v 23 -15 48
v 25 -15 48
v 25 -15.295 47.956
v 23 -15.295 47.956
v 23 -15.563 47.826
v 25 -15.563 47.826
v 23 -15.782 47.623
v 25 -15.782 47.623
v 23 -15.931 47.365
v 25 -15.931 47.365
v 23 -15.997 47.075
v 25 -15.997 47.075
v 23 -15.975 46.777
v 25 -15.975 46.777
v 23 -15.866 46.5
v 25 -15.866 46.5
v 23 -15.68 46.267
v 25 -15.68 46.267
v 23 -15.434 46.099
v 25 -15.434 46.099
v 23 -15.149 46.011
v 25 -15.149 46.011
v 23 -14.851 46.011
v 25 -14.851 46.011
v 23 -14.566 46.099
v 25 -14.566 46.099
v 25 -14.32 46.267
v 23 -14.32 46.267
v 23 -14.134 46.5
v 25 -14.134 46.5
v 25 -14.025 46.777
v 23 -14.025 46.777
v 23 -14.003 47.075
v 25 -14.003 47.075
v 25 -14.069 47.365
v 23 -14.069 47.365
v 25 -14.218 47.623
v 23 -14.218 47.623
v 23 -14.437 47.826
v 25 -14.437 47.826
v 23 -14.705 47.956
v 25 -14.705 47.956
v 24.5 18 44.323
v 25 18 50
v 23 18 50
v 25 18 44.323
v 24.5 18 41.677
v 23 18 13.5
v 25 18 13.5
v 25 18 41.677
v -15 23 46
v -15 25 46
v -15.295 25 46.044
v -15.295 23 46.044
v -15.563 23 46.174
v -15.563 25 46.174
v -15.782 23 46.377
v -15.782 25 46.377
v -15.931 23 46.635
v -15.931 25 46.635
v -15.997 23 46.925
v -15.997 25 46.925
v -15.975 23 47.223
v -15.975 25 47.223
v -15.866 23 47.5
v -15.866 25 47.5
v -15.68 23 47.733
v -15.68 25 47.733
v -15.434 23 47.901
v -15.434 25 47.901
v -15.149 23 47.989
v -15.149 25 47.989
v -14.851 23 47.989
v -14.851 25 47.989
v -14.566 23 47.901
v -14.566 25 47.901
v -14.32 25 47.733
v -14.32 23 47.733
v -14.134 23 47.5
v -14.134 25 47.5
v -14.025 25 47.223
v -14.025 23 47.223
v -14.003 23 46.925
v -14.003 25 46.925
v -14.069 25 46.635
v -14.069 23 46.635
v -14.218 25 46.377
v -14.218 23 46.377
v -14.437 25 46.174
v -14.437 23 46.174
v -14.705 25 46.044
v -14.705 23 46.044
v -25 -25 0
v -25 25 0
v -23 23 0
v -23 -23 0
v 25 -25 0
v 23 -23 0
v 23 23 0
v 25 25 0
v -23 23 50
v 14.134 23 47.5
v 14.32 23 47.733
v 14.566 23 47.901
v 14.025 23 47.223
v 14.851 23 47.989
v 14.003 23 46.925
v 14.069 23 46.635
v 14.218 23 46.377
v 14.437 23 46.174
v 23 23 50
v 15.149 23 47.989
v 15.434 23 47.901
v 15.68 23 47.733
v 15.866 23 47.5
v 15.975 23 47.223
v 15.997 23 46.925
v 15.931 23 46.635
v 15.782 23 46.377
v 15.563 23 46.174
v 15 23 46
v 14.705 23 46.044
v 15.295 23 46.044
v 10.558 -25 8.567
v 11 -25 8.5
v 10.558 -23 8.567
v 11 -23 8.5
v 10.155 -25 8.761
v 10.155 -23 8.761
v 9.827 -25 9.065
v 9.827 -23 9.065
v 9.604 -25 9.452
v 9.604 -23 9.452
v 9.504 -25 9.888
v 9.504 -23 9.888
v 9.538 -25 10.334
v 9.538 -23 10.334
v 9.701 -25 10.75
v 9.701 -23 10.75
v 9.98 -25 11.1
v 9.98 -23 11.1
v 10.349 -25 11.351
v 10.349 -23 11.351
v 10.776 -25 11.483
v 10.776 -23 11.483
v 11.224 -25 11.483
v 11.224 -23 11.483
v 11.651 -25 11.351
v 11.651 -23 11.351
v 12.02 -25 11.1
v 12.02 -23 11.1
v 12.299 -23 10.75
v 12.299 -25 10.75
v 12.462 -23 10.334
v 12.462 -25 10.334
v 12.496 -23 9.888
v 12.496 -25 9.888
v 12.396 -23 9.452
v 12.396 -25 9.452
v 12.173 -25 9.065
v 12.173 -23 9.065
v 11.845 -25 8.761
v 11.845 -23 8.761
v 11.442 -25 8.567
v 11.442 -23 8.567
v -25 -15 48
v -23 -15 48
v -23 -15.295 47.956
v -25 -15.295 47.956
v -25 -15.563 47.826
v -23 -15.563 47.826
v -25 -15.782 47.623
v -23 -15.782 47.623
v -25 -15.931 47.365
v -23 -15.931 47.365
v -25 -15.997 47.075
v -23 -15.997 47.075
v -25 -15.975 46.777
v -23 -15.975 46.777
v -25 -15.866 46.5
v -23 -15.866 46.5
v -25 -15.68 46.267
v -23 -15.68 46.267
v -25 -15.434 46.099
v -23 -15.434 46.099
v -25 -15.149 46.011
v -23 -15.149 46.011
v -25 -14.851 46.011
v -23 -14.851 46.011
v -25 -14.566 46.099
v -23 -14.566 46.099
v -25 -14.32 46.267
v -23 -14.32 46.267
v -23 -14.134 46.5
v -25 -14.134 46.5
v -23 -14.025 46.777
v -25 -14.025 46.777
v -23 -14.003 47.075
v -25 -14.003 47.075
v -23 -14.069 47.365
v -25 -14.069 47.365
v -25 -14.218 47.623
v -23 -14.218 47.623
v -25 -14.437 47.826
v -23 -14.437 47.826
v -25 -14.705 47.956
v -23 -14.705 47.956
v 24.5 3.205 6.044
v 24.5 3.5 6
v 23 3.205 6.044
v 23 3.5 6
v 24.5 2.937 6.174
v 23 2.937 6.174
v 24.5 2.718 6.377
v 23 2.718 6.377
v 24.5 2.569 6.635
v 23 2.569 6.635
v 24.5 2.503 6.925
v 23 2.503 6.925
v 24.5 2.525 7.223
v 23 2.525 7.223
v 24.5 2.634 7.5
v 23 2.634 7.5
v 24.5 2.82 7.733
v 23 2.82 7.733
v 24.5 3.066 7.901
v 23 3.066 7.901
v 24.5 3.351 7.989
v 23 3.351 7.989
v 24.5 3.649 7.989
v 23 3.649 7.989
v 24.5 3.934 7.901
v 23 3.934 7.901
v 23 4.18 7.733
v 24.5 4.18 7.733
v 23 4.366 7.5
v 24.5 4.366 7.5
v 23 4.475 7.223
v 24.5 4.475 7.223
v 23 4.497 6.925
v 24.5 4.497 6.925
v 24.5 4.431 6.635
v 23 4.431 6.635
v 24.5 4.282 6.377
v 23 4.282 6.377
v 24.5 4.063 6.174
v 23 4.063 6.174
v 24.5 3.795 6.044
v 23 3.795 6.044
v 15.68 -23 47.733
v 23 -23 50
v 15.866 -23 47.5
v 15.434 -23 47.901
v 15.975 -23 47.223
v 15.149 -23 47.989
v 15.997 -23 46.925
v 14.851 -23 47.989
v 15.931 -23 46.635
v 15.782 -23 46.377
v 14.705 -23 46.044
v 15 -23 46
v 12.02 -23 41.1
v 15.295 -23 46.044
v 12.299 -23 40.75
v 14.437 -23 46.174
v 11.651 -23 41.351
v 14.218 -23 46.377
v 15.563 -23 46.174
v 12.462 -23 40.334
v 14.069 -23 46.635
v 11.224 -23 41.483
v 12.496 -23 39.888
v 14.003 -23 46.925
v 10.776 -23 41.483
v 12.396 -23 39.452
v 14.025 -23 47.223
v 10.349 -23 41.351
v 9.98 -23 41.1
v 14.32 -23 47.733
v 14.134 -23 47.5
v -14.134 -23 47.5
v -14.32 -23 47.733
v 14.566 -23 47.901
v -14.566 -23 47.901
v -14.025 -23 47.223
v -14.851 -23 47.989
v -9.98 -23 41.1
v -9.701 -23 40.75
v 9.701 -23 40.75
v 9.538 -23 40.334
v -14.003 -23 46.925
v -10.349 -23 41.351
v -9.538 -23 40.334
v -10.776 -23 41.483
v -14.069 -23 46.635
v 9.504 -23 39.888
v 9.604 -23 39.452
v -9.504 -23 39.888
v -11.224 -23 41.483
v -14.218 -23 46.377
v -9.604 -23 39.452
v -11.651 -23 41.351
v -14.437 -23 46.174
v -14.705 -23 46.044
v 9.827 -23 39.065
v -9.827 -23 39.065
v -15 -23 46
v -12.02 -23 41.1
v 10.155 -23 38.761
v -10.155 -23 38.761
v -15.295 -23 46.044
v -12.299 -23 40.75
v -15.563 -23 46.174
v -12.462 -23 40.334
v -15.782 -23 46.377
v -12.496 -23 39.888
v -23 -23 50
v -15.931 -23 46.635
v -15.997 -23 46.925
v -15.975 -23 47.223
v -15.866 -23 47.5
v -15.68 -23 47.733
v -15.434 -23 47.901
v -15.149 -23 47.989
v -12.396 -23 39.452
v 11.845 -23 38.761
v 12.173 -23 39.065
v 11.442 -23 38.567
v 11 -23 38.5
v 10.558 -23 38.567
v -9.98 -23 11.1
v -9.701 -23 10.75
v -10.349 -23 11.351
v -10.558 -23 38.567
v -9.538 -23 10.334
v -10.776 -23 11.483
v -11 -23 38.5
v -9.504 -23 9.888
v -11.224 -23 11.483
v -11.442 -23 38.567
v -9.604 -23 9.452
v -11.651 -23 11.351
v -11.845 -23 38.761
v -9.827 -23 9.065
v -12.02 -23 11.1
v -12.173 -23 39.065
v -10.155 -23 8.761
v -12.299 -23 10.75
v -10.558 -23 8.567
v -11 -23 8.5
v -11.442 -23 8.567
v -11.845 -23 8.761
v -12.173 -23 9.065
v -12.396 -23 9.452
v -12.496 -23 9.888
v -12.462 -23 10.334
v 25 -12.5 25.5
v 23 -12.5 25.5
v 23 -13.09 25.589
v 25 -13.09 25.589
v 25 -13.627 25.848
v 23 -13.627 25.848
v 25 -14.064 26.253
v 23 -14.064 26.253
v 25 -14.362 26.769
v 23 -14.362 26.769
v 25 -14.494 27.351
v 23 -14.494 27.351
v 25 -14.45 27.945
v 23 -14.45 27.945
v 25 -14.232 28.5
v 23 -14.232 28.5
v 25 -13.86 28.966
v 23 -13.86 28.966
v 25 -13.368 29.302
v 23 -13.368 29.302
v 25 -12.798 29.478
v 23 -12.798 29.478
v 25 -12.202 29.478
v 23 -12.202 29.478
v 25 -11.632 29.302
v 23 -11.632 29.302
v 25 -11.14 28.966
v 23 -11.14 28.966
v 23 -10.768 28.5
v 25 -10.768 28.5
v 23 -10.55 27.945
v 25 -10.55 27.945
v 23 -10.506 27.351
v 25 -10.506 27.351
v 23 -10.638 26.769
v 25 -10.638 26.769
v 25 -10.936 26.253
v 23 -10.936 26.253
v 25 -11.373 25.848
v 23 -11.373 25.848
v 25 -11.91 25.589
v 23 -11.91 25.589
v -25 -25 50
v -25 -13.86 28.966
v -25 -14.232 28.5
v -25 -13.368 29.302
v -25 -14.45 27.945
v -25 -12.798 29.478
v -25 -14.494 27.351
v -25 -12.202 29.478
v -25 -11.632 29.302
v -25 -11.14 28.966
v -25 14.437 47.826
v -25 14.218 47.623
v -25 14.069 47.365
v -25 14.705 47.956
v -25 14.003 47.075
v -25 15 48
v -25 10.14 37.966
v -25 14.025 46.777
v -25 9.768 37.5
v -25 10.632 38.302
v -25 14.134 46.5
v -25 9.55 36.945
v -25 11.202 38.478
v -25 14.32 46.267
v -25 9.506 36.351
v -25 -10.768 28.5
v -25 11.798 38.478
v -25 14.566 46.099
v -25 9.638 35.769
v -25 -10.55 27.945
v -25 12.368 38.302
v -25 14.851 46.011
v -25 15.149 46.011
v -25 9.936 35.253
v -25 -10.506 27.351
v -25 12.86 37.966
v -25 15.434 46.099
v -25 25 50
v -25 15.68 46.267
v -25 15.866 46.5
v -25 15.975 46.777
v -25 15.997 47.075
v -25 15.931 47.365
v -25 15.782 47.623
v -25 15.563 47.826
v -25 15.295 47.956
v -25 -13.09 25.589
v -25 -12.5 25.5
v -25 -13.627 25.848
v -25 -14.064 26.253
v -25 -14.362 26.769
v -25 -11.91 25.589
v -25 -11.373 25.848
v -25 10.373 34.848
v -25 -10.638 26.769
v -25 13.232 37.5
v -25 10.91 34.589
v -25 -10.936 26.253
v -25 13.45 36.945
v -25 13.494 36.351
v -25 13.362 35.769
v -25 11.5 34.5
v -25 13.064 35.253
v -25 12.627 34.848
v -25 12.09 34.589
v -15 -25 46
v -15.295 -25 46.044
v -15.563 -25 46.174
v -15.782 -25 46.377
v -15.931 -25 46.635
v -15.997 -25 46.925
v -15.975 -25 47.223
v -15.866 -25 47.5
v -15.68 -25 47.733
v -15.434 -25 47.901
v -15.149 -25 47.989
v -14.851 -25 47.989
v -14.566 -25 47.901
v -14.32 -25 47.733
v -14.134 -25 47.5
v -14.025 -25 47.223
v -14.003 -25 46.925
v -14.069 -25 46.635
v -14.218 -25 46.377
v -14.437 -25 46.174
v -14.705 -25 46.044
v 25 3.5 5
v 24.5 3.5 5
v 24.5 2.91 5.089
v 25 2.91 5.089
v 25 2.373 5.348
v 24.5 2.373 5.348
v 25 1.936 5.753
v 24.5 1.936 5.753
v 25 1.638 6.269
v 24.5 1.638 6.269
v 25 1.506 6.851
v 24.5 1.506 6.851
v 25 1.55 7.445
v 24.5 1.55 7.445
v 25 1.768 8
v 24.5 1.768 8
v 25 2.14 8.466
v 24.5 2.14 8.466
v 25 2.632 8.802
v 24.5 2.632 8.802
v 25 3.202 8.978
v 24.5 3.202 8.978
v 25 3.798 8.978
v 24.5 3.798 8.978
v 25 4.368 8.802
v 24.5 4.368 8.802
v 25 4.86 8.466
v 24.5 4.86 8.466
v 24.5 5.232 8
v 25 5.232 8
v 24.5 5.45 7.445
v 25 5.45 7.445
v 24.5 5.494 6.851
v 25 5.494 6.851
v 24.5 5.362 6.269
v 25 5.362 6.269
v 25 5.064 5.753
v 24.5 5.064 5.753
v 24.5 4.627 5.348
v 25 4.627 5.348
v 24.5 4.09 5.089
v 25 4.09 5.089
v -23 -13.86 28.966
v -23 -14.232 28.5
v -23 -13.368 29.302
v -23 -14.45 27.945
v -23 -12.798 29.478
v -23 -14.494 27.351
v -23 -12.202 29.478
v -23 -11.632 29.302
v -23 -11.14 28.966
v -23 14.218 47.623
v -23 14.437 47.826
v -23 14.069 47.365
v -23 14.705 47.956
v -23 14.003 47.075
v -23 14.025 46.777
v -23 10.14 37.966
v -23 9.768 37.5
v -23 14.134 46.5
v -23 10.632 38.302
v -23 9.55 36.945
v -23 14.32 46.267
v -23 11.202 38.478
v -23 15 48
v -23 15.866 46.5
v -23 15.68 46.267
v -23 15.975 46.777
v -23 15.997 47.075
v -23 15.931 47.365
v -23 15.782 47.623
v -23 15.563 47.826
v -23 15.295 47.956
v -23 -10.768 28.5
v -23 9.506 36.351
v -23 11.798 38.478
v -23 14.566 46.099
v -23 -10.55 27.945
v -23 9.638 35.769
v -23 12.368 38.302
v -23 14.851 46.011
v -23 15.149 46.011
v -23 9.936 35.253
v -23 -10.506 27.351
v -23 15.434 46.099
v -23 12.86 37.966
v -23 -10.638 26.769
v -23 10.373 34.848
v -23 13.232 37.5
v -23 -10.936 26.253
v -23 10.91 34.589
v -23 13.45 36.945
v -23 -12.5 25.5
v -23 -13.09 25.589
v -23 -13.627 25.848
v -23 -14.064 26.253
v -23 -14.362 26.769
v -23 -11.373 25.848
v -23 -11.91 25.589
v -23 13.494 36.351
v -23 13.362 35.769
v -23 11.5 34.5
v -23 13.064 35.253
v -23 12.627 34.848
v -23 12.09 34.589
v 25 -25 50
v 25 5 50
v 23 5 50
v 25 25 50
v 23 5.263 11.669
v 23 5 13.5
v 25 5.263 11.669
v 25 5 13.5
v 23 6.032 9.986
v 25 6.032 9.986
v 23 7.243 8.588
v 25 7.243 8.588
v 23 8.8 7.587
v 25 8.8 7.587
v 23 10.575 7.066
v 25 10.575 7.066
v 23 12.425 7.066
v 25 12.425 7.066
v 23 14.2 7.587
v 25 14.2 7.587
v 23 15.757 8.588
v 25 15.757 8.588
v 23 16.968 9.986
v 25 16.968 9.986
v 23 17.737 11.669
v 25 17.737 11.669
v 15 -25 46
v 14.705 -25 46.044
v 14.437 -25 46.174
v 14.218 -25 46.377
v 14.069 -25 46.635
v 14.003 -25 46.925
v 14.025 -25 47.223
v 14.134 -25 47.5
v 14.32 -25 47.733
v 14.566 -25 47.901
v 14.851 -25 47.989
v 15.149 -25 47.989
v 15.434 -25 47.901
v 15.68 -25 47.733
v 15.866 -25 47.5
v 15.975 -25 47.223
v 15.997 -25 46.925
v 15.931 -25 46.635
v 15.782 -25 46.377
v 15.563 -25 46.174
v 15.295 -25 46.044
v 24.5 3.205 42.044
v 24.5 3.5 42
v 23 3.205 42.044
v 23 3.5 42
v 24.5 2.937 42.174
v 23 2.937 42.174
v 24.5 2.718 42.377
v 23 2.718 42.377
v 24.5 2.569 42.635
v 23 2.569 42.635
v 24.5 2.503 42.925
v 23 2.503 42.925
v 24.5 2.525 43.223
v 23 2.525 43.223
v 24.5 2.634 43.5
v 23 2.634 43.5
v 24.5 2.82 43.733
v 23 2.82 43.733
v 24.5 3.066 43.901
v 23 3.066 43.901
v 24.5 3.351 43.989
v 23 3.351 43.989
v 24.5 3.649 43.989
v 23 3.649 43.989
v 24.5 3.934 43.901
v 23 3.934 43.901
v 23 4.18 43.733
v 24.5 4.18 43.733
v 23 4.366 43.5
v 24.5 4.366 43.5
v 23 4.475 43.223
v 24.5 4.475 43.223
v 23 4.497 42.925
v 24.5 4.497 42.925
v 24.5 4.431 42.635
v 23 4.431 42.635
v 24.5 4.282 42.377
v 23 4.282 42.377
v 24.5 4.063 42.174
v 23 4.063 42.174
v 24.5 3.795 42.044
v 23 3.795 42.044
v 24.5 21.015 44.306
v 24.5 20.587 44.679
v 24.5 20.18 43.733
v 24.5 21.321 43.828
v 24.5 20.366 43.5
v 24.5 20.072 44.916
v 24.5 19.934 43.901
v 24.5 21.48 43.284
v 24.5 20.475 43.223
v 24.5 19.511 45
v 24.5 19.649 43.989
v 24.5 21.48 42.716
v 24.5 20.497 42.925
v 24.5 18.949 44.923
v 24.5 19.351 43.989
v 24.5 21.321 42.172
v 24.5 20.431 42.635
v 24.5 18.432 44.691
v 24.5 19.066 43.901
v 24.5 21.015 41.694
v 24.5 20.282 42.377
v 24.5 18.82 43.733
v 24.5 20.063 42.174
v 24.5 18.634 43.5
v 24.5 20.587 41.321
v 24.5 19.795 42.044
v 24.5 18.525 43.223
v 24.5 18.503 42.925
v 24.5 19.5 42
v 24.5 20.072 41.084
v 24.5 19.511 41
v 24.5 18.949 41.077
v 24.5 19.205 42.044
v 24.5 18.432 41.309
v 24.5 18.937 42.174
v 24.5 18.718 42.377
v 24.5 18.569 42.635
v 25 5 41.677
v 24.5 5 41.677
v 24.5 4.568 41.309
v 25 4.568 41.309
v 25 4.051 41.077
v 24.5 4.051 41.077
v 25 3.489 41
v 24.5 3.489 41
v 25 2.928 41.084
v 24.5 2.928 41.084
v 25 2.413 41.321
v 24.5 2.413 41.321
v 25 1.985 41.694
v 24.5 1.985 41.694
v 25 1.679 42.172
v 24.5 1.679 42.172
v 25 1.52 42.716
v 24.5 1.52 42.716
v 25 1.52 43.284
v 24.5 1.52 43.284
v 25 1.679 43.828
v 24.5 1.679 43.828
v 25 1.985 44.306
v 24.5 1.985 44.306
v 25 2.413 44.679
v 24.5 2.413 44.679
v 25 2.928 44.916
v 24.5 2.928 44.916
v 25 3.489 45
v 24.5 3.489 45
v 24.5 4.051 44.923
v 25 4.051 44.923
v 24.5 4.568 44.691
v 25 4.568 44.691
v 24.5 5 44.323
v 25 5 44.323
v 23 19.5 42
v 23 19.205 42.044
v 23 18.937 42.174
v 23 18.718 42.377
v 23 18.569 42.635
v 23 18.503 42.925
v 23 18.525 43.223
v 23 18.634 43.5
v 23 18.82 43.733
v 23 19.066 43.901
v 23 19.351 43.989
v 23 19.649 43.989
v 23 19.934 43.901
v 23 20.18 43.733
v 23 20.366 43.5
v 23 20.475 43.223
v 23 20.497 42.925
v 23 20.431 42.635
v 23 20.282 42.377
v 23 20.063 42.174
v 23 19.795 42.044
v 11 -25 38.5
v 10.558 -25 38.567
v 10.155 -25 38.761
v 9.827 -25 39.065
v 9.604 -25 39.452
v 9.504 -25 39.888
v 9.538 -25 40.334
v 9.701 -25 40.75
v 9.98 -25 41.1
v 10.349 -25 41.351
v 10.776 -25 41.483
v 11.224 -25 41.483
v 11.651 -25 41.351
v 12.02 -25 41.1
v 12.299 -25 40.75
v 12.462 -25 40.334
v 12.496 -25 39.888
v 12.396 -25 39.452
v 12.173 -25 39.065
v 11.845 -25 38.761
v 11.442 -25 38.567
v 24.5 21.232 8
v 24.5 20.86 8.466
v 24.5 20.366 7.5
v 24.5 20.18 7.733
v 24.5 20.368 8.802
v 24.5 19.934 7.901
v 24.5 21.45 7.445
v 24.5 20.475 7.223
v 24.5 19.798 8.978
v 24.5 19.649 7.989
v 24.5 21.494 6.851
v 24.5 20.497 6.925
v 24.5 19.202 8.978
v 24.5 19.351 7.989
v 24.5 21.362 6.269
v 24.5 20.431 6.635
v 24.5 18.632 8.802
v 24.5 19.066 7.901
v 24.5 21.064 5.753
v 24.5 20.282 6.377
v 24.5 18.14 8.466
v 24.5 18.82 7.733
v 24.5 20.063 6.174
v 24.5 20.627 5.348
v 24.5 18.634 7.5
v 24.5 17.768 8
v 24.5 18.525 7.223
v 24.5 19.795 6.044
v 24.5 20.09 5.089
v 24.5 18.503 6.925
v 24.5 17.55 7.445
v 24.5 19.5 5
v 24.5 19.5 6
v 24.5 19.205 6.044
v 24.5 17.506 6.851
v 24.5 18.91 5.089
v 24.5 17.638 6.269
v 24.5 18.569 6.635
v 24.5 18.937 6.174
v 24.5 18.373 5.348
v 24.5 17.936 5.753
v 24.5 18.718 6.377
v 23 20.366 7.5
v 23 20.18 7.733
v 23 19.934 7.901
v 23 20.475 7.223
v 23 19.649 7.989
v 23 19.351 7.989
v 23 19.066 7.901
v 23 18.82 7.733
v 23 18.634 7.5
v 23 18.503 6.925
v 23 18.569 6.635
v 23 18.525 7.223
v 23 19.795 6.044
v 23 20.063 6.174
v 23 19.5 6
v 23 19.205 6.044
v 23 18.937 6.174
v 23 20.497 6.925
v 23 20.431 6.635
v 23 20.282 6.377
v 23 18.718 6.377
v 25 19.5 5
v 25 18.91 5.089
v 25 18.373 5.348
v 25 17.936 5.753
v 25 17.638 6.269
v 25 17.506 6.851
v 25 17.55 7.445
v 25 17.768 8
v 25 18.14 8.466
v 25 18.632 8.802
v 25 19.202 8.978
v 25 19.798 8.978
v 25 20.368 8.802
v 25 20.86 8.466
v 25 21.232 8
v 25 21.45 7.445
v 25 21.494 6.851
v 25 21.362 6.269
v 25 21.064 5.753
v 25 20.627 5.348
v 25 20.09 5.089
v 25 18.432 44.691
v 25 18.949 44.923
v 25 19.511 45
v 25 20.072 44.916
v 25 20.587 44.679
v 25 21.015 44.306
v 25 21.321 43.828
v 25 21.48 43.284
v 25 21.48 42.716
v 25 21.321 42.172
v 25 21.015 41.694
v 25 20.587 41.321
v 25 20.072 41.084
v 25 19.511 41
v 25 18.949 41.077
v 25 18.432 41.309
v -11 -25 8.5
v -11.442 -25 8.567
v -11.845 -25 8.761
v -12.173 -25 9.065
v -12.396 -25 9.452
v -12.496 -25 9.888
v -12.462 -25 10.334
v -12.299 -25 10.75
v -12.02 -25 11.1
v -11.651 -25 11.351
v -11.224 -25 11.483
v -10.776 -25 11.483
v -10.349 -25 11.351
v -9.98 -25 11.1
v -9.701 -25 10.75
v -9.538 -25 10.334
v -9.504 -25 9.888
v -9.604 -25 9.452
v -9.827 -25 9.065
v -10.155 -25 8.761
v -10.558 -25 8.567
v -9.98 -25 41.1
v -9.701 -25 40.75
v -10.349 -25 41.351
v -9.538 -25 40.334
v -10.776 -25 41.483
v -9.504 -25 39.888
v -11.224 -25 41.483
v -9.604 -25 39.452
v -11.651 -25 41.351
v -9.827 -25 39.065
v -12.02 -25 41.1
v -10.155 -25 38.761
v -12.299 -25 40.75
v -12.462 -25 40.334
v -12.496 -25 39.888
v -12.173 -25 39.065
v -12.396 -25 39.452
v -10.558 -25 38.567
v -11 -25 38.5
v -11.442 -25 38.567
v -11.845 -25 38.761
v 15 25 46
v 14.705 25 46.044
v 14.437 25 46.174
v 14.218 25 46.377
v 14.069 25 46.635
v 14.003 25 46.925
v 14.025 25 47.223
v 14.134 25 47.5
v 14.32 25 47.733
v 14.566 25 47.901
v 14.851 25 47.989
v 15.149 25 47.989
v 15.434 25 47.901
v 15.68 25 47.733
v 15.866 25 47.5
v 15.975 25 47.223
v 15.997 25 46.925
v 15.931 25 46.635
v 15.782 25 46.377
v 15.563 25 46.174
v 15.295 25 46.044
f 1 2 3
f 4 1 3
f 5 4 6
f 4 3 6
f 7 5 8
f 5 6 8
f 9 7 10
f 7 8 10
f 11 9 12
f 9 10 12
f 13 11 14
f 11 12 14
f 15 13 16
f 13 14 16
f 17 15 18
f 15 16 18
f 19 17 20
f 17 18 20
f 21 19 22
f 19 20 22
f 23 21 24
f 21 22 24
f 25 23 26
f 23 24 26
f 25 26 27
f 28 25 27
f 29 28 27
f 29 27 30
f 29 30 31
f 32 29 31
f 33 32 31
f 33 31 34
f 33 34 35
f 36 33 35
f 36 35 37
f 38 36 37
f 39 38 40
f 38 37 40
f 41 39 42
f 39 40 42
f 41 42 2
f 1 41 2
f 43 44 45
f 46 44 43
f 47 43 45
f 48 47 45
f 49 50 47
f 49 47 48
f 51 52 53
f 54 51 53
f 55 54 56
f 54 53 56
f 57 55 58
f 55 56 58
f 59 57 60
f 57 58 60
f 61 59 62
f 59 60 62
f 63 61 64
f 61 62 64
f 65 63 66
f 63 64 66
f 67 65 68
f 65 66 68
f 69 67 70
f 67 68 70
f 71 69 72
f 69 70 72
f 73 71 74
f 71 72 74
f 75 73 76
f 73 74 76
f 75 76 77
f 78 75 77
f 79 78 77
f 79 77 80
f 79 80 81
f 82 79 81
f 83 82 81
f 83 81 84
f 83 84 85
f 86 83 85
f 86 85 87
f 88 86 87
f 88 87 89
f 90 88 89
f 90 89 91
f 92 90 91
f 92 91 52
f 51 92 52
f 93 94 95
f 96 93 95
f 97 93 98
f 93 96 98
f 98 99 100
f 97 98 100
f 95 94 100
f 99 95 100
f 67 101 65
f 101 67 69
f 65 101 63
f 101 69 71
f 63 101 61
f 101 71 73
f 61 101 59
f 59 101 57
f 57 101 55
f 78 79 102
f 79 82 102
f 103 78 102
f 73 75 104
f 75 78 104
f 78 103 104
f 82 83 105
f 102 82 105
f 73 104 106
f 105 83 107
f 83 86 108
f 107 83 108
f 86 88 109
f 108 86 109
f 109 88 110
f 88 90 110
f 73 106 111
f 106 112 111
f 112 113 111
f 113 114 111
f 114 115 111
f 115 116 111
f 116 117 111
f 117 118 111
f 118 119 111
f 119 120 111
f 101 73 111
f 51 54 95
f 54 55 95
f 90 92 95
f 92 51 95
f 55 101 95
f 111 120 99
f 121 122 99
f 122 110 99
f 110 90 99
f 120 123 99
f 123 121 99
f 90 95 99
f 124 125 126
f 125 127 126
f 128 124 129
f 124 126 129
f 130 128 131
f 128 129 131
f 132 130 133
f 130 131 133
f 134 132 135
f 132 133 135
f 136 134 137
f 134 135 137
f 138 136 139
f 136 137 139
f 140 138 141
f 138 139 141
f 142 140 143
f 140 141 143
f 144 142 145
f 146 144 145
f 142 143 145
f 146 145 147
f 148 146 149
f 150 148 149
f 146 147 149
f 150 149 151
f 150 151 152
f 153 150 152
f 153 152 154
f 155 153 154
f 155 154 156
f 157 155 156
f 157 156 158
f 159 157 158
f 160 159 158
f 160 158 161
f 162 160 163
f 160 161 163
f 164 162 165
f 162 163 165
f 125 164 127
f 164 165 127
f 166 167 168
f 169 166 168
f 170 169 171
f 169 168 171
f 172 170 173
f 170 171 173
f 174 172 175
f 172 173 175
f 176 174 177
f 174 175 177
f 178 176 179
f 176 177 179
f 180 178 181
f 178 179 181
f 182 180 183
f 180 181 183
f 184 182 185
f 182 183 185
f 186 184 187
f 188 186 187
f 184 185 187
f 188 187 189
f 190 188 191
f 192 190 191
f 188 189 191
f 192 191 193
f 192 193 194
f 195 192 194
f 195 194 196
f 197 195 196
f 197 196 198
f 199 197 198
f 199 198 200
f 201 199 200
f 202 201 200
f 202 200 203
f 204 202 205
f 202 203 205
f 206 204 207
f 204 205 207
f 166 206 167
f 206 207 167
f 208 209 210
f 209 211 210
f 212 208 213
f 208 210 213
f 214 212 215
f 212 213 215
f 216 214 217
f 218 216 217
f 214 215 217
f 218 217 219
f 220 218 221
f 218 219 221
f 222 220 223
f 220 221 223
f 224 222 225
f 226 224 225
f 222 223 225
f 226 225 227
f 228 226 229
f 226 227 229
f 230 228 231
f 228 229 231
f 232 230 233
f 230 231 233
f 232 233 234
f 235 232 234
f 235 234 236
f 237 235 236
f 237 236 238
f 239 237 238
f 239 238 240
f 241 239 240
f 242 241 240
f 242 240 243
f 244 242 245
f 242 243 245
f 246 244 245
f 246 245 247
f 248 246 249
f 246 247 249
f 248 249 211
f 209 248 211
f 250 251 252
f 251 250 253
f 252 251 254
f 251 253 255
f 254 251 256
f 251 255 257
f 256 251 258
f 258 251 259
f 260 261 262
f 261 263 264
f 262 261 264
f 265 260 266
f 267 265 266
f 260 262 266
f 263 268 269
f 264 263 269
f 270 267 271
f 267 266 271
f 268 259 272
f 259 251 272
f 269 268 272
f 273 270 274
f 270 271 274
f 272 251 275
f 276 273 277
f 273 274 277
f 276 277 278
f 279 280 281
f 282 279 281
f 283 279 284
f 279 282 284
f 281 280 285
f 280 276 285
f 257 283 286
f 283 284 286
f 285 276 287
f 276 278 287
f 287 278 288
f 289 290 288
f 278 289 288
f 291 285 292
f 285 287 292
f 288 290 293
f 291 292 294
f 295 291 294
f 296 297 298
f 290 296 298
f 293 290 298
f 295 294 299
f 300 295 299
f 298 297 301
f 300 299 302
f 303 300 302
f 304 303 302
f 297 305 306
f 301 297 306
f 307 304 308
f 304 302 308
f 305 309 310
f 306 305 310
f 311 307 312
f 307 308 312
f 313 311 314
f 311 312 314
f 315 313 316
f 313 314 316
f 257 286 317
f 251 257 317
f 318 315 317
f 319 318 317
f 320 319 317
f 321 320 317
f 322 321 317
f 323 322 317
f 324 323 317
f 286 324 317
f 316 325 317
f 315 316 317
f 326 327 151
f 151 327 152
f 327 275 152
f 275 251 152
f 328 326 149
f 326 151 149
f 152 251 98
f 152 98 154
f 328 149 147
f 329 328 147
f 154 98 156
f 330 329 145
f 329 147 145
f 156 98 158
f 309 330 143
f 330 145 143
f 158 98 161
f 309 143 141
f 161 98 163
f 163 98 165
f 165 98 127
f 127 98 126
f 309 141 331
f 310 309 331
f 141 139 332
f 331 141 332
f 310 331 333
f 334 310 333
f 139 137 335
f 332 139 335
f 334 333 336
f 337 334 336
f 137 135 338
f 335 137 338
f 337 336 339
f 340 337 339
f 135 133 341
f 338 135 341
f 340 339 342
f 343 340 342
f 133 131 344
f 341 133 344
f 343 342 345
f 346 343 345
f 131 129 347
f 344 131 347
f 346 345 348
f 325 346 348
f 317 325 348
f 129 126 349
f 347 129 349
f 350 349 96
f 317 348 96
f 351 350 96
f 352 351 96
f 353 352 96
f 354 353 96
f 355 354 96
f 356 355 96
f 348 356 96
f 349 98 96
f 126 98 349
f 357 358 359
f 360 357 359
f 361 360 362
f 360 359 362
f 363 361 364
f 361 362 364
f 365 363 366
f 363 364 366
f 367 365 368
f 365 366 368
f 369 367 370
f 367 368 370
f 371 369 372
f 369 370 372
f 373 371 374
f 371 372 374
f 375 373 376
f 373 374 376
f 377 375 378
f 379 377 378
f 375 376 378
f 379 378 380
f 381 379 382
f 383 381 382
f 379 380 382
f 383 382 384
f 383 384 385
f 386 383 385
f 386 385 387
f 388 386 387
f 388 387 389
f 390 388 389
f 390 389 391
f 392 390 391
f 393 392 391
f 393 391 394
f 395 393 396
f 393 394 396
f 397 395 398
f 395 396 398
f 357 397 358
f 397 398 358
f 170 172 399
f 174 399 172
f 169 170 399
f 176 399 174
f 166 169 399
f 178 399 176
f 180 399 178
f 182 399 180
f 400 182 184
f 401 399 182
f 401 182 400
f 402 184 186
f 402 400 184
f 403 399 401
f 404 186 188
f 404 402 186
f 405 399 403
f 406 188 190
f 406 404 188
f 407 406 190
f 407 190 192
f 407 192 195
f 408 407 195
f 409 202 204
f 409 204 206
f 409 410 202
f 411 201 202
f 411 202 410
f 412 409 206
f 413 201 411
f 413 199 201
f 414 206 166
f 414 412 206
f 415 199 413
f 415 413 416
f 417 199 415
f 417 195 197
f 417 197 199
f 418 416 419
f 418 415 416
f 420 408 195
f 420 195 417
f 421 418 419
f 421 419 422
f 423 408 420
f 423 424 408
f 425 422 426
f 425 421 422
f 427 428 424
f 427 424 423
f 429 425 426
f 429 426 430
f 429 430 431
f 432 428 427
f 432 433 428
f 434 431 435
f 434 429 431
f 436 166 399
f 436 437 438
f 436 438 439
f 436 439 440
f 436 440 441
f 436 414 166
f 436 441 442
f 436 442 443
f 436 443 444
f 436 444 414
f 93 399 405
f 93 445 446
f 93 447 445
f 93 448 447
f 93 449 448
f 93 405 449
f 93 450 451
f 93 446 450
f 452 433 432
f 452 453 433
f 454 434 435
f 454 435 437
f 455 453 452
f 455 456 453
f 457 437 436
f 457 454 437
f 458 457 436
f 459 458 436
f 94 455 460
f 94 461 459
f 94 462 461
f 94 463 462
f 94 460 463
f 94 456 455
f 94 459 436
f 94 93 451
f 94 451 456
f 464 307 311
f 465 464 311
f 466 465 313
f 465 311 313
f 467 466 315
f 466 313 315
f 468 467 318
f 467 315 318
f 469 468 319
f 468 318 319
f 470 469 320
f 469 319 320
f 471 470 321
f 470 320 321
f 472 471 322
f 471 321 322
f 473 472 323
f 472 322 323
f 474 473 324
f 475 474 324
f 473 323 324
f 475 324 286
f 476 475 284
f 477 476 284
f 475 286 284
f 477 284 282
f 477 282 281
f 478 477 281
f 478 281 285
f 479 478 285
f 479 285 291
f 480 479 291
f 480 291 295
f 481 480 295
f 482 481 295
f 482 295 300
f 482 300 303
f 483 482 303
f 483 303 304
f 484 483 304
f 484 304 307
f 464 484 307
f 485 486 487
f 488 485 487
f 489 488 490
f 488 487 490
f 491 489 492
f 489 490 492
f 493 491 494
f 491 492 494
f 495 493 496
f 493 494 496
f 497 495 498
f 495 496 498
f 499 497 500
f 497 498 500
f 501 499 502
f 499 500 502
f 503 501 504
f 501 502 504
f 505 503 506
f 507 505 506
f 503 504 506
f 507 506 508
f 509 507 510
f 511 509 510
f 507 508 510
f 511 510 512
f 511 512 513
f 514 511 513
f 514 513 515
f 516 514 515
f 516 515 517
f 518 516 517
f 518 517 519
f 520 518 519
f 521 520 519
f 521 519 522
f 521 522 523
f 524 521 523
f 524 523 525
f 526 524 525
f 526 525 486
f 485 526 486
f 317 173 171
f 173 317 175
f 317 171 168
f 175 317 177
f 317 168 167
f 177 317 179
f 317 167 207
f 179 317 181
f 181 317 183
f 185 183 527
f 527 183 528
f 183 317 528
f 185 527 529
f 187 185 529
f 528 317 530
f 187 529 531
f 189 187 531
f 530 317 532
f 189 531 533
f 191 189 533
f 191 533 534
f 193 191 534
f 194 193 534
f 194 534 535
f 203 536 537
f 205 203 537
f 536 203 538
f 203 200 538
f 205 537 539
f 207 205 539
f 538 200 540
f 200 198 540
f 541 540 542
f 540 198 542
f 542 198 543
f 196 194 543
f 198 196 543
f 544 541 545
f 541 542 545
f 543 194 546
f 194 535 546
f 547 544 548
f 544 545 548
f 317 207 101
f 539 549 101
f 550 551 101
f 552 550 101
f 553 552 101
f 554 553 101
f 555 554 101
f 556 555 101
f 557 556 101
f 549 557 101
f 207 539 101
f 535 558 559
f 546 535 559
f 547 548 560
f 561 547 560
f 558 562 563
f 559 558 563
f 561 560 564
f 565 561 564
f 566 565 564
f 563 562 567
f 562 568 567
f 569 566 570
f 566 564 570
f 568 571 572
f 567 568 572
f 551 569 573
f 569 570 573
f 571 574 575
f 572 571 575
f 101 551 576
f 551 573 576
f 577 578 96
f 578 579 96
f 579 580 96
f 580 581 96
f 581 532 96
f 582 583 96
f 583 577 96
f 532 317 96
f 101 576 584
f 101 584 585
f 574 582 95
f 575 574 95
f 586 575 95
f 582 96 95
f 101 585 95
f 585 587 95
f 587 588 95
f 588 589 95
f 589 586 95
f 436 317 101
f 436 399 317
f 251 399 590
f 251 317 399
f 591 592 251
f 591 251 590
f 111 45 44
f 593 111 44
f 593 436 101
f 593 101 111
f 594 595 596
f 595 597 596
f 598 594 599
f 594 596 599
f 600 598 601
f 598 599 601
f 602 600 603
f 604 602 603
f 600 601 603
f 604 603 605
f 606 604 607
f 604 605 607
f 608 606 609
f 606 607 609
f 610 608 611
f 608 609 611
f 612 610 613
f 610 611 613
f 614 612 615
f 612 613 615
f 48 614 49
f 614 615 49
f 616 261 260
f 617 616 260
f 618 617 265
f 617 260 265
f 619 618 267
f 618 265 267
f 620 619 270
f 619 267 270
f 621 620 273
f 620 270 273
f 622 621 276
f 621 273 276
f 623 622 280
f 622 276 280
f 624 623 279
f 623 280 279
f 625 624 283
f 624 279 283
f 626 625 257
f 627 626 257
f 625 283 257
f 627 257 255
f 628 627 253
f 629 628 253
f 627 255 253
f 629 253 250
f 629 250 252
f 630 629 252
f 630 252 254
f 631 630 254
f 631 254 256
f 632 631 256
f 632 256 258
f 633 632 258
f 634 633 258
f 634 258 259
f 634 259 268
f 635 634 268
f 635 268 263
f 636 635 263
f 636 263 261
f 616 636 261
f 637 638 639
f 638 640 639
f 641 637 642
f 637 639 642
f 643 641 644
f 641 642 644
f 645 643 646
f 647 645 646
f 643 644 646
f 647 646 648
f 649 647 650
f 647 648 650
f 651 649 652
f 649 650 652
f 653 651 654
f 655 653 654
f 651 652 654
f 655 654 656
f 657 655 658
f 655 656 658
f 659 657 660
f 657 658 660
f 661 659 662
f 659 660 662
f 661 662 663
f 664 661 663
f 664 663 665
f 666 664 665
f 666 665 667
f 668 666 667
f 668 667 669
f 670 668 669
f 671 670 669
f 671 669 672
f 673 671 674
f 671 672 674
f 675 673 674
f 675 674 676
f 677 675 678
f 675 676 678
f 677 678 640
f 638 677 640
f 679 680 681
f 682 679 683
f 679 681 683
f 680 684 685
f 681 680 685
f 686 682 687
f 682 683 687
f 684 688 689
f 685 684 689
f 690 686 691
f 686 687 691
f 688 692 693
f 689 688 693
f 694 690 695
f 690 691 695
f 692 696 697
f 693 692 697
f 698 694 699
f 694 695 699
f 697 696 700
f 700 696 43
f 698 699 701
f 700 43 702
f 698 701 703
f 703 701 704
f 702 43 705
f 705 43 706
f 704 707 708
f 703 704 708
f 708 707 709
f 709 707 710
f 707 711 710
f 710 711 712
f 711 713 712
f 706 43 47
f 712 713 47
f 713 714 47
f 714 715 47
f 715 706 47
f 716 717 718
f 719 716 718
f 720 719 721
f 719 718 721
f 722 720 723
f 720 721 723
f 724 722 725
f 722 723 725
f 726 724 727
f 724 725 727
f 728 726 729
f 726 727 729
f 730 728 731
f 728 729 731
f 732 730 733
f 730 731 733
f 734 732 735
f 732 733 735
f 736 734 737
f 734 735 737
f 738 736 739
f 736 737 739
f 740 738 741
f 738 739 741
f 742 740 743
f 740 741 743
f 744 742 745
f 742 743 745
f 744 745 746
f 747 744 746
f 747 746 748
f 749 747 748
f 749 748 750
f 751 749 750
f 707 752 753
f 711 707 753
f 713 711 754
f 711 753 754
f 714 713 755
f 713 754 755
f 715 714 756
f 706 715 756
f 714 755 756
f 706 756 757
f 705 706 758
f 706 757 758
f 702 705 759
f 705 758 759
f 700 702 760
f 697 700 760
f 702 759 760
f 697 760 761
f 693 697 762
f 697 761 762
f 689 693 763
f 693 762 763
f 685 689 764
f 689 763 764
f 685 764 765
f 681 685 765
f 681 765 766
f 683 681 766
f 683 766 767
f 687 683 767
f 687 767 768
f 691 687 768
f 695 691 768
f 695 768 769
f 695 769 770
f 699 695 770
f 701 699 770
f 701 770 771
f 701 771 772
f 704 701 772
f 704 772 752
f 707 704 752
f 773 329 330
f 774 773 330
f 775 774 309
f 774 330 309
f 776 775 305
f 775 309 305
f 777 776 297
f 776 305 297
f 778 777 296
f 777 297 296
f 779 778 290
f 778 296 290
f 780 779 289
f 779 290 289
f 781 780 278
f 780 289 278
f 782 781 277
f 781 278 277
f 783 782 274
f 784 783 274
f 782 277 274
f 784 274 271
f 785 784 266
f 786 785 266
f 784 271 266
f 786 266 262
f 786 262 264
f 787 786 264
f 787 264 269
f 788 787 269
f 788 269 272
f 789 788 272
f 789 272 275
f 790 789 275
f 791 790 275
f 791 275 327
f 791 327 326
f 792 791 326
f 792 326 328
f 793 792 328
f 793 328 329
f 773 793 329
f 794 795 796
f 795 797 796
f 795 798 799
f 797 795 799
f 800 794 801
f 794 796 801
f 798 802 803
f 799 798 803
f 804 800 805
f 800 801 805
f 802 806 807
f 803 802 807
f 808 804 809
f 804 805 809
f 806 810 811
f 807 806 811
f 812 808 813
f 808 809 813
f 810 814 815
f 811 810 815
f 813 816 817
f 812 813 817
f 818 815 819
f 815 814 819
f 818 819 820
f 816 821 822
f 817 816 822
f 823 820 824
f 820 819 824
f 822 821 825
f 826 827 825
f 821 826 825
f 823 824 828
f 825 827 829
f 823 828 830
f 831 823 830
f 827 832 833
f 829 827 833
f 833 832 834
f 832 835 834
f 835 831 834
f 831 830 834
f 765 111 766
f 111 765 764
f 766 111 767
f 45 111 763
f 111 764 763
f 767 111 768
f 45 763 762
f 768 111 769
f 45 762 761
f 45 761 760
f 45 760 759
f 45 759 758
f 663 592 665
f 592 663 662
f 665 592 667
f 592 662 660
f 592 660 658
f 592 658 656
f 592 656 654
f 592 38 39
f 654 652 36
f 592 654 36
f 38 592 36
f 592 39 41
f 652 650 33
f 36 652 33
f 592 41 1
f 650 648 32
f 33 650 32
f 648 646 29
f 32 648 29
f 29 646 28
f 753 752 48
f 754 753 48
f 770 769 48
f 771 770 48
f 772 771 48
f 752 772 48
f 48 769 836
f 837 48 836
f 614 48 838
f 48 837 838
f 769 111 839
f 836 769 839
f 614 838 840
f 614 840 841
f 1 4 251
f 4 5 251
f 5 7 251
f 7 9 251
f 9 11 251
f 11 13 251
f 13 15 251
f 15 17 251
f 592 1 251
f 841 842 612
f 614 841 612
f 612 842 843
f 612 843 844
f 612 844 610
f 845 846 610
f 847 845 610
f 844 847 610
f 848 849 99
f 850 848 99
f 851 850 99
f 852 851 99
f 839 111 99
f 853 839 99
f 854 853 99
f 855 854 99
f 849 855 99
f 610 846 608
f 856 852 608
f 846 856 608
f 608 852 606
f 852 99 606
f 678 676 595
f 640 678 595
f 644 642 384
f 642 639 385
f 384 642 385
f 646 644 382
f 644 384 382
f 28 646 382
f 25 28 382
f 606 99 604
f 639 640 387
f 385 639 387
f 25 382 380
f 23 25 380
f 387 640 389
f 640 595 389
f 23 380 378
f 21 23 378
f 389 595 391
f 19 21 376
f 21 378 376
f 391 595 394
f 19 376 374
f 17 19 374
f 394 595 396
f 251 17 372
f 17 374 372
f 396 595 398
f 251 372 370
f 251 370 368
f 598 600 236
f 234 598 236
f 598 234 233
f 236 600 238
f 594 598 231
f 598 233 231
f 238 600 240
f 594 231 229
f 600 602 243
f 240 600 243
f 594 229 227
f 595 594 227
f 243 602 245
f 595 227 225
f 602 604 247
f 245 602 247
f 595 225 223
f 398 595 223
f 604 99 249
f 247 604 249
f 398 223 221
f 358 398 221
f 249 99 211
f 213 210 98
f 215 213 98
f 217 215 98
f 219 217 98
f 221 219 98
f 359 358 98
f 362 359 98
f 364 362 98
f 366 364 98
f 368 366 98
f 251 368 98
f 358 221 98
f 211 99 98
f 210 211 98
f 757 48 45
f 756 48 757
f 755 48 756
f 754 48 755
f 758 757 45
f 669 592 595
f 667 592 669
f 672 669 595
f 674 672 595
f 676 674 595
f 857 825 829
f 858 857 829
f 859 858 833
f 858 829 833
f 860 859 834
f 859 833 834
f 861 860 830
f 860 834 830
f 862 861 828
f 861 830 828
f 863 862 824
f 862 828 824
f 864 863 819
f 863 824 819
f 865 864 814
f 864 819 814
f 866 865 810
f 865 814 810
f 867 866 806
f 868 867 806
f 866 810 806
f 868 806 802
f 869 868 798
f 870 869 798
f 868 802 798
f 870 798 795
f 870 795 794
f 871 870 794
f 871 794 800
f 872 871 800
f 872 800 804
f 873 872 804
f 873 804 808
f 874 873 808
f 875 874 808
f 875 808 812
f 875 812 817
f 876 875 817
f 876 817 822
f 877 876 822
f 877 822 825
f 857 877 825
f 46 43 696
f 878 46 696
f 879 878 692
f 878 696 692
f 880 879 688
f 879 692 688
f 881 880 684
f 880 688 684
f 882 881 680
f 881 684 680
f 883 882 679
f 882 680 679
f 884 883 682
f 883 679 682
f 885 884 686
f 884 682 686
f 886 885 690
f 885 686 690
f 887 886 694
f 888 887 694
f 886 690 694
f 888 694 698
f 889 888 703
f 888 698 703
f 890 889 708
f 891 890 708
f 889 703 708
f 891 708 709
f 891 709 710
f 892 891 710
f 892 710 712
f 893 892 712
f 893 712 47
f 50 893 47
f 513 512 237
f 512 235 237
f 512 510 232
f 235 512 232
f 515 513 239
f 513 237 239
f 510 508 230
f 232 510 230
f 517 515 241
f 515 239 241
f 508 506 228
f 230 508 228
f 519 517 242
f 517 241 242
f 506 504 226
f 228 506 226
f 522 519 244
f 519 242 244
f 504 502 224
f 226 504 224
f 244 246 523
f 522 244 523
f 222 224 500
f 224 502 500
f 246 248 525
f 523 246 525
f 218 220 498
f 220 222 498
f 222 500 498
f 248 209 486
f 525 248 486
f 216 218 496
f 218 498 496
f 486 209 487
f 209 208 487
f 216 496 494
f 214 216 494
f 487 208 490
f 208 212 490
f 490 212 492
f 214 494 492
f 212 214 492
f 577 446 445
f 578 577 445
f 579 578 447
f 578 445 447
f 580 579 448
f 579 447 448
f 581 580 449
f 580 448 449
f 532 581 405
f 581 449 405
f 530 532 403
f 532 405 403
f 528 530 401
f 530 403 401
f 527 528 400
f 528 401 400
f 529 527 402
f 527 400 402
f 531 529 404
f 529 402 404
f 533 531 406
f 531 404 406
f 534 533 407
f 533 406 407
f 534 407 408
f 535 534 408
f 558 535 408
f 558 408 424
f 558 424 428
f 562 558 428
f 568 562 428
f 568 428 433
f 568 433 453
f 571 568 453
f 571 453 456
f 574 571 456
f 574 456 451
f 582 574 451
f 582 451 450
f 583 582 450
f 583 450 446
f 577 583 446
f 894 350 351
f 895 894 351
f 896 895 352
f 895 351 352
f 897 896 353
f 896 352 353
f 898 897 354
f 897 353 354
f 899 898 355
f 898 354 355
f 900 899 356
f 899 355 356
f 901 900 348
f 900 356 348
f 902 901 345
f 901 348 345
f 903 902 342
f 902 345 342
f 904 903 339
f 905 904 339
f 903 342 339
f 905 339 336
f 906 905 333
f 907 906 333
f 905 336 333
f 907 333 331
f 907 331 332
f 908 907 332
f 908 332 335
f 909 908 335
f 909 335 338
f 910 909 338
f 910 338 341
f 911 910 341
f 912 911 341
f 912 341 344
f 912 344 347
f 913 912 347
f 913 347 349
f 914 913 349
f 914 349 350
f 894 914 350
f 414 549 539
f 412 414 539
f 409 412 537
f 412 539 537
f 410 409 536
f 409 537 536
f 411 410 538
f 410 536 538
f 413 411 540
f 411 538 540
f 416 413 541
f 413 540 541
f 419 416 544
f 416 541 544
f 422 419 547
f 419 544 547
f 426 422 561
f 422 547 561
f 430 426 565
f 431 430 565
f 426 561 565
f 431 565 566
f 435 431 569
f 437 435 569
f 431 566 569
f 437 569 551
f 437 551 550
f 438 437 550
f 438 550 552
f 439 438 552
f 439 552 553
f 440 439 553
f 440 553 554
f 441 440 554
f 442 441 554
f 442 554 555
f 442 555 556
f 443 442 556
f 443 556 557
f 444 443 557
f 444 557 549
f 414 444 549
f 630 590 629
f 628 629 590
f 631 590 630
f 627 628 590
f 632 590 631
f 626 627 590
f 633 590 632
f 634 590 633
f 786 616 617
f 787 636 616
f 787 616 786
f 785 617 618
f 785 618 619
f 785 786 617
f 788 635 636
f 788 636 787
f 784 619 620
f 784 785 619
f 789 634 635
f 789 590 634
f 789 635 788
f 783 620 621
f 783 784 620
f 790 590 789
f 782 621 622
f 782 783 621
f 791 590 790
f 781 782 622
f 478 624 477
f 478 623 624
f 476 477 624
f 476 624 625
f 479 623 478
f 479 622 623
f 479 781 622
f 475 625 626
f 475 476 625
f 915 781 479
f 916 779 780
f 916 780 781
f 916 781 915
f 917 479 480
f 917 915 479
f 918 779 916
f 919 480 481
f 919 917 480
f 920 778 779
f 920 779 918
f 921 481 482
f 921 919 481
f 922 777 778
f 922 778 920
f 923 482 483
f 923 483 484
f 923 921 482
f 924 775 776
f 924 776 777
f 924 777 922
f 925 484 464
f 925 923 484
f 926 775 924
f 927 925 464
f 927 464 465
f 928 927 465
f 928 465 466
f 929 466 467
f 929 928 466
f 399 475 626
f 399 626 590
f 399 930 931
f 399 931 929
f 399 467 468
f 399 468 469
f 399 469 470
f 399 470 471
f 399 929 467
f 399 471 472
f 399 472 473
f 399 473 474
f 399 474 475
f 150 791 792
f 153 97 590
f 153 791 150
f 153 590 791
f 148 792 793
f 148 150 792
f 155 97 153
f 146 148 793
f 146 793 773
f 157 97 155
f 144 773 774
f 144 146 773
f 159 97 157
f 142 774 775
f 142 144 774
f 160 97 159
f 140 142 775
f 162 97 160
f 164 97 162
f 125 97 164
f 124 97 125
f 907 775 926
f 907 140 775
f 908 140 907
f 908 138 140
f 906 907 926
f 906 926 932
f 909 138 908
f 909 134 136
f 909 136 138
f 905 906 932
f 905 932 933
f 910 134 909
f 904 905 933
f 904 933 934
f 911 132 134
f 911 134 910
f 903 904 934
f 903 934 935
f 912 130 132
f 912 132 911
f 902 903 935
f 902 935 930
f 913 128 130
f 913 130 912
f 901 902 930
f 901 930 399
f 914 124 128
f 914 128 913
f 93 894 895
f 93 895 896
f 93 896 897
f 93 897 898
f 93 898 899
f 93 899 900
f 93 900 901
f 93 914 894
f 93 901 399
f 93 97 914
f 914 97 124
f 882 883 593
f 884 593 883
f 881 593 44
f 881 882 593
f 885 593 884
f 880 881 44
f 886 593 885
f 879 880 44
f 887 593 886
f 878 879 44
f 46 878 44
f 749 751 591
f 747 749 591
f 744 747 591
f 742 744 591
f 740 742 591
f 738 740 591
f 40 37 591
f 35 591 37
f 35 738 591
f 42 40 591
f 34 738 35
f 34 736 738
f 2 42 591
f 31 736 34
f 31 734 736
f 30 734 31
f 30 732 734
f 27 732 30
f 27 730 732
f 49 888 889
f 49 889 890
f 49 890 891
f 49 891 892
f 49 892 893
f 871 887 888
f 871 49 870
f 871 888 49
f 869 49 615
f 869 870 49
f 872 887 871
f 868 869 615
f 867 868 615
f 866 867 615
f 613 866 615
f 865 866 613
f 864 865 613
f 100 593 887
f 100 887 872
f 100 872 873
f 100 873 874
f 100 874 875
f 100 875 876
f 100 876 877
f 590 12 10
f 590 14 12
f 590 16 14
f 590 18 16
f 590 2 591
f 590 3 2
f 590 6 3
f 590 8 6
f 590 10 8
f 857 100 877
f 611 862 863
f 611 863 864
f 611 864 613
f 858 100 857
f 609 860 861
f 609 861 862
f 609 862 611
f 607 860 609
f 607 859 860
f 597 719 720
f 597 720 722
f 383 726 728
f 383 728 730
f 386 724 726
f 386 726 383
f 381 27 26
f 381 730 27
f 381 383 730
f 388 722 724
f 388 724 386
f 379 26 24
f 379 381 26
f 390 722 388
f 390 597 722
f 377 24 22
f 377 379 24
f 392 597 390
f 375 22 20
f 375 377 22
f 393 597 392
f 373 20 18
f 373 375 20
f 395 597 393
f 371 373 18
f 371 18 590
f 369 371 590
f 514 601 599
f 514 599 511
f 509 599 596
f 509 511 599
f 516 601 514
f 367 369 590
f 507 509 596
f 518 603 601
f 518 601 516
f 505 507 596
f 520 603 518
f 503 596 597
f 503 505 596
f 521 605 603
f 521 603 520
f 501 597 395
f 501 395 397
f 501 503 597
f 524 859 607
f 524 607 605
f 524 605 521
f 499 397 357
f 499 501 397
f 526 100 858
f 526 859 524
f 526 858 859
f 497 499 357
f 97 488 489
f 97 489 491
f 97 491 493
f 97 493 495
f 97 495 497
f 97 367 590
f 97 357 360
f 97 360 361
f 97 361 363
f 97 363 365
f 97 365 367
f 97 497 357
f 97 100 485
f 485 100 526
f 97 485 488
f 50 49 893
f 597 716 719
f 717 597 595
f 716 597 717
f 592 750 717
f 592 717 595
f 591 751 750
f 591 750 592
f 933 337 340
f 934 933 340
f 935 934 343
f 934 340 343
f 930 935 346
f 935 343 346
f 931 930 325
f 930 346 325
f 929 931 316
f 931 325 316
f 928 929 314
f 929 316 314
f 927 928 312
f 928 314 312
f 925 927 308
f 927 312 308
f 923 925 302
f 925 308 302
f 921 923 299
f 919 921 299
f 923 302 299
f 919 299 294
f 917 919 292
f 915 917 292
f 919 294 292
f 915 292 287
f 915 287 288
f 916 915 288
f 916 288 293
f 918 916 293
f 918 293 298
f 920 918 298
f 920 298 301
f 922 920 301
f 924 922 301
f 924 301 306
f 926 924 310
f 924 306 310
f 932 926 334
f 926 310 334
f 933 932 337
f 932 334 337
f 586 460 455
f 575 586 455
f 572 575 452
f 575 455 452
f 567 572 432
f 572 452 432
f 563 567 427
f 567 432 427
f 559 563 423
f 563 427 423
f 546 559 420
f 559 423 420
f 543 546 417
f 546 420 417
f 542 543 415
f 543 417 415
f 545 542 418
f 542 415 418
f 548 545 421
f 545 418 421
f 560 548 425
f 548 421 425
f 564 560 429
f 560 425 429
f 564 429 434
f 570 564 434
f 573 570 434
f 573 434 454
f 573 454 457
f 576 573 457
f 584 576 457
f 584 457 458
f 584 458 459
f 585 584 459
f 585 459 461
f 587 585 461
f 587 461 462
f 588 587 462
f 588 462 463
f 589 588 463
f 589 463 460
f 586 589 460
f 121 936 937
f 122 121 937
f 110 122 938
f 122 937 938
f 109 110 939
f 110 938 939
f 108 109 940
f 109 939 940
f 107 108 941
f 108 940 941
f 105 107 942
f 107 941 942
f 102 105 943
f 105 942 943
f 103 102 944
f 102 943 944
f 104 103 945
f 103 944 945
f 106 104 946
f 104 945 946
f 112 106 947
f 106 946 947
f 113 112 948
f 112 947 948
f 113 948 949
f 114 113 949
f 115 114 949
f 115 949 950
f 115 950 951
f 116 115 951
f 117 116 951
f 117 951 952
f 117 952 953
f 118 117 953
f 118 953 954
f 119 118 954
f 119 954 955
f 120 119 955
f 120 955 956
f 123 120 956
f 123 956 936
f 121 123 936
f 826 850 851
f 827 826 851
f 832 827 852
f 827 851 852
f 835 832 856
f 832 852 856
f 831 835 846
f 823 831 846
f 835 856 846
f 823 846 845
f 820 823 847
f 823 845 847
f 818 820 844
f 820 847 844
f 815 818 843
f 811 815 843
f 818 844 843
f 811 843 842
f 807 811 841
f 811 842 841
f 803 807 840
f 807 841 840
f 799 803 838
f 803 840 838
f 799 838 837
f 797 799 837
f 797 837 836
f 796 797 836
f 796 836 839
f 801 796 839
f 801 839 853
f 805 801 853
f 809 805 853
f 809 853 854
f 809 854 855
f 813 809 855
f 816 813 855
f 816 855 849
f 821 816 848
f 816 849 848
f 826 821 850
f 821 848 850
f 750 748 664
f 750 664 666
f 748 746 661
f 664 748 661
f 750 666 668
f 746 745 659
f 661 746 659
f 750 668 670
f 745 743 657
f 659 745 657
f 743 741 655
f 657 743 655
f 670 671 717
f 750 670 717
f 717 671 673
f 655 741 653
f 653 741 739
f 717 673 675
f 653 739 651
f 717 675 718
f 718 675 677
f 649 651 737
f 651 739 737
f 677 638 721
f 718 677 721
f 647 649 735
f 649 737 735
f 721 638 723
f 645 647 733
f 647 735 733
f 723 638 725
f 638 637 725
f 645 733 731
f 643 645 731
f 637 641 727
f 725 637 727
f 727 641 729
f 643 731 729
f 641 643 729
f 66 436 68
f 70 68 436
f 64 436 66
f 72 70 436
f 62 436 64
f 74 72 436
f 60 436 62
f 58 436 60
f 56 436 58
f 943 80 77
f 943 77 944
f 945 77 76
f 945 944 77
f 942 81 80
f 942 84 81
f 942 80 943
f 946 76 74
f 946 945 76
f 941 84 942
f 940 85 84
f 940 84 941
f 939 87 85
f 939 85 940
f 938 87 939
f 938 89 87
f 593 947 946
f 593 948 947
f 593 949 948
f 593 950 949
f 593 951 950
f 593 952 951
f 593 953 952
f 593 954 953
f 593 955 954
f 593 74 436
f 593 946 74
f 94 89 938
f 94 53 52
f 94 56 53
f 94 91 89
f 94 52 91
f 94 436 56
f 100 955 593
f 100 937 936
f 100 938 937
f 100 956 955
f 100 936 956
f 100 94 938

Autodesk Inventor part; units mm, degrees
ref_plane "YZ Plane" through (0, 0, 0) normal (1, 0, 0) x (0, 1, 0)
ref_plane "XZ Plane" through (0, 0, 0) normal (0, 1, 0) x (-1, 0, 0)
ref_plane "XY Plane" through (0, 0, 0) normal (0, 0, 1) x (1, 0, 0)
sketch "スケッチ1" plane through (0, 0, 0) normal (0, 0, 1) x (1, 0, 0)
  line L0 (-25, 25) -> (25, 25)
  line L1 (25, 25) -> (25, -25)
  line L2 (25, -25) -> (-25, -25)
  line L3 (-25, -25) -> (-25, 25)
  line L4 (-23, 23) -> (23, 23)
  line L5 (23, 23) -> (23, -23)
  line L6 (23, -23) -> (-23, -23)
  line L7 (-23, -23) -> (-23, 23)
  point P0 (0, 0)
  dimension "d0" = 50
  dimension "d1" = 50
  dimension "d4" = 25
  dimension "d5" = 25
  dimension "d6" = 46
  dimension "d7" = 2
  dimension "d8" = 46
  dimension "d9" = 2
extrude "押し出し1" add sketch "スケッチ1" along normal blind 50
sketch "スケッチ2" plane through (25, -25, 0) normal (1, 0, 0) x (0, 0, -1)
  line L0 (-50, 50) -> (-50, 0) projected
  line L1 (-50, 43) -> (-13.5, 43)
  line L2 (-13.5, 30) -> (-50, 30)
  line L3 (-50, 30) -> (-50, 43)
  arc A0 (-13.5, 30) -> (-13.5, 43) centre (-13.5, 36.5) ccw
  line L4 (0, 50) -> (-50, 50) projected
  point P0 (0, 25)
  point P1 (-11.7323, 30.245)
  dimension "d34" = 13
  dimension "d43" = 13
  dimension "d44" = 6.5
  dimension "d46" = 36.5
  dimension "d236" = 7
extrude "押し出し2" cut sketch "スケッチ2" against normal blind 30.5
sketch "スケッチ3" plane through (25, -25, 0) normal (1, 0, 0) x (0, 0, -1)
  arc A0 (-13.5, 30) -> (-13.5, 43) centre (-13.5, 36.5) ccw projected
  line L0 (-13.5, 30) -> (-50, 30) projected
  circle A1 centre (-7, 44.5) radius 1
  circle A2 centre (-43, 44.5) radius 1
  circle A3 centre (-43, 28.5) radius 1
  circle A4 centre (-7, 28.5) radius 1
  point P0 (0, 25)
  dimension "d47" = 8
  dimension "d48" = 8
  dimension "d49" = 16
  dimension "d50" = 1.5
  dimension "d51" = 36
  dimension "d52" = 36
  dimension "d53" = 6.5
  dimension "d55" = 2
  dimension "d56" = 6.5
hole "穴1" at (25, 3.5, 43) at (25, 19.5, 7) at (25, 3.5, 7) at (25, 19.5, 43) direction (-1, 0, 0) diameter 2 depth 2 tip angle 118 counterbore diameter 4 counterbore depth 0.5
sketch "スケッチ11" plane through (25, -25, 0) normal (1, 0, 0) x (0, 0, -1)
  circle A0 centre (-36.5, 36.5) radius 1.5
  line L0 (-50, 50) -> (-50, 43) projected
  circle A1 centre (-27.5, 12.5) radius 1.5
  line L1 (0, 50) -> (0, 0) projected
  line L2 (0, 50) -> (-50, 50) projected
  point P0 (0, 25)
  dimension "d109" = 3
  dimension "d128" = 24
  dimension "d237" = 13.5
  dimension "d238" = 27.5
  dimension "d239" = 13.5
hole "穴6" at (25, -12.5, 27.5) at (25, 11.5, 36.5) direction (-1, 0, 0) diameter 4 end through all
sketch "スケッチ18" plane through (-25, -25, 0) normal (0, -1, 0) x (1, 0, 0)
  line L0 (50, 50) -> (0, 50) projected
  line L1 (50, 0) -> (0, 0) projected
  circle A0 centre (14, 40) radius 1.5
  circle A1 centre (36, 40) radius 1.5
  circle A2 centre (14, 10) radius 1.5
  circle A3 centre (36, 10) radius 1.5
  line L2 (0, 0) -> (0, 50) projected
  line L3 (50, 0) -> (50, 50) projected
  point P0 (49.5, 0)
  point P1 (49.5, 50)
  point P2 (25, 0)
  dimension "d240" = 10
  dimension "d241" = 10
  dimension "d242" = 10
  dimension "d243" = 10
  dimension "d248" = 3
  dimension "d267" = 22
  dimension "d268" = 22
  dimension "d269" = 14
  dimension "d270" = 14
hole "穴13" at (-11, -25, 40) at (-11, -25, 10) at (11, -25, 40) at (11, -25, 10) direction (0, 1, 0) diameter 3 depth 2 tip angle 118
thread "ねじ13" size "M3x0.5" class "6H" standard "ANSI Metric M Profile" full length
thread "ねじ14" size "M3x0.5" class "6H" standard "ANSI Metric M Profile" full length
thread "ねじ15" size "M3x0.5" class "6H" standard "ANSI Metric M Profile" full length
thread "ねじ16" size "M3x0.5" class "6H" standard "ANSI Metric M Profile" full length
sketch "スケッチ19" plane through (-25, -25, 0) normal (-1, 0, 0) x (0, 0, 1)
  line L0 (50, 0) -> (50, 50) projected
  line L1 (0, 50) -> (50, 50) projected
  circle A0 centre (47, 40) radius 1.1
  circle A1 centre (47, 10) radius 1.1
  point P0 (0, 25)
  dimension "d271" = 2.2
  dimension "d273" = 30
  dimension "d274" = 10
  dimension "d275" = 3
  dimension "d276" = 3
hole "穴14" at (-25, 15, 47) at (-25, -15, 47) direction (1, 0, 0) diameter 2 end through all
sketch "スケッチ20" plane through (-25, -25, 0) normal (0, -1, 0) x (1, 0, 0)
  line L0 (50, 50) -> (0, 50) projected
  line L1 (0, 0) -> (0, 50) projected
  circle A0 centre (10, 47) radius 1.1
  circle A1 centre (40, 47) radius 1.1
  point P0 (25, 0)
  dimension "d284" = 2.2
  dimension "d287" = 10
  dimension "d288" = 30
  dimension "d289" = 3
  dimension "d290" = 3
hole "穴15" at (-15, -25, 47) at (15, -25, 47) direction (0, 1, 0) diameter 2 end through all
properties part number "04" material "アルミニウム 6061"
